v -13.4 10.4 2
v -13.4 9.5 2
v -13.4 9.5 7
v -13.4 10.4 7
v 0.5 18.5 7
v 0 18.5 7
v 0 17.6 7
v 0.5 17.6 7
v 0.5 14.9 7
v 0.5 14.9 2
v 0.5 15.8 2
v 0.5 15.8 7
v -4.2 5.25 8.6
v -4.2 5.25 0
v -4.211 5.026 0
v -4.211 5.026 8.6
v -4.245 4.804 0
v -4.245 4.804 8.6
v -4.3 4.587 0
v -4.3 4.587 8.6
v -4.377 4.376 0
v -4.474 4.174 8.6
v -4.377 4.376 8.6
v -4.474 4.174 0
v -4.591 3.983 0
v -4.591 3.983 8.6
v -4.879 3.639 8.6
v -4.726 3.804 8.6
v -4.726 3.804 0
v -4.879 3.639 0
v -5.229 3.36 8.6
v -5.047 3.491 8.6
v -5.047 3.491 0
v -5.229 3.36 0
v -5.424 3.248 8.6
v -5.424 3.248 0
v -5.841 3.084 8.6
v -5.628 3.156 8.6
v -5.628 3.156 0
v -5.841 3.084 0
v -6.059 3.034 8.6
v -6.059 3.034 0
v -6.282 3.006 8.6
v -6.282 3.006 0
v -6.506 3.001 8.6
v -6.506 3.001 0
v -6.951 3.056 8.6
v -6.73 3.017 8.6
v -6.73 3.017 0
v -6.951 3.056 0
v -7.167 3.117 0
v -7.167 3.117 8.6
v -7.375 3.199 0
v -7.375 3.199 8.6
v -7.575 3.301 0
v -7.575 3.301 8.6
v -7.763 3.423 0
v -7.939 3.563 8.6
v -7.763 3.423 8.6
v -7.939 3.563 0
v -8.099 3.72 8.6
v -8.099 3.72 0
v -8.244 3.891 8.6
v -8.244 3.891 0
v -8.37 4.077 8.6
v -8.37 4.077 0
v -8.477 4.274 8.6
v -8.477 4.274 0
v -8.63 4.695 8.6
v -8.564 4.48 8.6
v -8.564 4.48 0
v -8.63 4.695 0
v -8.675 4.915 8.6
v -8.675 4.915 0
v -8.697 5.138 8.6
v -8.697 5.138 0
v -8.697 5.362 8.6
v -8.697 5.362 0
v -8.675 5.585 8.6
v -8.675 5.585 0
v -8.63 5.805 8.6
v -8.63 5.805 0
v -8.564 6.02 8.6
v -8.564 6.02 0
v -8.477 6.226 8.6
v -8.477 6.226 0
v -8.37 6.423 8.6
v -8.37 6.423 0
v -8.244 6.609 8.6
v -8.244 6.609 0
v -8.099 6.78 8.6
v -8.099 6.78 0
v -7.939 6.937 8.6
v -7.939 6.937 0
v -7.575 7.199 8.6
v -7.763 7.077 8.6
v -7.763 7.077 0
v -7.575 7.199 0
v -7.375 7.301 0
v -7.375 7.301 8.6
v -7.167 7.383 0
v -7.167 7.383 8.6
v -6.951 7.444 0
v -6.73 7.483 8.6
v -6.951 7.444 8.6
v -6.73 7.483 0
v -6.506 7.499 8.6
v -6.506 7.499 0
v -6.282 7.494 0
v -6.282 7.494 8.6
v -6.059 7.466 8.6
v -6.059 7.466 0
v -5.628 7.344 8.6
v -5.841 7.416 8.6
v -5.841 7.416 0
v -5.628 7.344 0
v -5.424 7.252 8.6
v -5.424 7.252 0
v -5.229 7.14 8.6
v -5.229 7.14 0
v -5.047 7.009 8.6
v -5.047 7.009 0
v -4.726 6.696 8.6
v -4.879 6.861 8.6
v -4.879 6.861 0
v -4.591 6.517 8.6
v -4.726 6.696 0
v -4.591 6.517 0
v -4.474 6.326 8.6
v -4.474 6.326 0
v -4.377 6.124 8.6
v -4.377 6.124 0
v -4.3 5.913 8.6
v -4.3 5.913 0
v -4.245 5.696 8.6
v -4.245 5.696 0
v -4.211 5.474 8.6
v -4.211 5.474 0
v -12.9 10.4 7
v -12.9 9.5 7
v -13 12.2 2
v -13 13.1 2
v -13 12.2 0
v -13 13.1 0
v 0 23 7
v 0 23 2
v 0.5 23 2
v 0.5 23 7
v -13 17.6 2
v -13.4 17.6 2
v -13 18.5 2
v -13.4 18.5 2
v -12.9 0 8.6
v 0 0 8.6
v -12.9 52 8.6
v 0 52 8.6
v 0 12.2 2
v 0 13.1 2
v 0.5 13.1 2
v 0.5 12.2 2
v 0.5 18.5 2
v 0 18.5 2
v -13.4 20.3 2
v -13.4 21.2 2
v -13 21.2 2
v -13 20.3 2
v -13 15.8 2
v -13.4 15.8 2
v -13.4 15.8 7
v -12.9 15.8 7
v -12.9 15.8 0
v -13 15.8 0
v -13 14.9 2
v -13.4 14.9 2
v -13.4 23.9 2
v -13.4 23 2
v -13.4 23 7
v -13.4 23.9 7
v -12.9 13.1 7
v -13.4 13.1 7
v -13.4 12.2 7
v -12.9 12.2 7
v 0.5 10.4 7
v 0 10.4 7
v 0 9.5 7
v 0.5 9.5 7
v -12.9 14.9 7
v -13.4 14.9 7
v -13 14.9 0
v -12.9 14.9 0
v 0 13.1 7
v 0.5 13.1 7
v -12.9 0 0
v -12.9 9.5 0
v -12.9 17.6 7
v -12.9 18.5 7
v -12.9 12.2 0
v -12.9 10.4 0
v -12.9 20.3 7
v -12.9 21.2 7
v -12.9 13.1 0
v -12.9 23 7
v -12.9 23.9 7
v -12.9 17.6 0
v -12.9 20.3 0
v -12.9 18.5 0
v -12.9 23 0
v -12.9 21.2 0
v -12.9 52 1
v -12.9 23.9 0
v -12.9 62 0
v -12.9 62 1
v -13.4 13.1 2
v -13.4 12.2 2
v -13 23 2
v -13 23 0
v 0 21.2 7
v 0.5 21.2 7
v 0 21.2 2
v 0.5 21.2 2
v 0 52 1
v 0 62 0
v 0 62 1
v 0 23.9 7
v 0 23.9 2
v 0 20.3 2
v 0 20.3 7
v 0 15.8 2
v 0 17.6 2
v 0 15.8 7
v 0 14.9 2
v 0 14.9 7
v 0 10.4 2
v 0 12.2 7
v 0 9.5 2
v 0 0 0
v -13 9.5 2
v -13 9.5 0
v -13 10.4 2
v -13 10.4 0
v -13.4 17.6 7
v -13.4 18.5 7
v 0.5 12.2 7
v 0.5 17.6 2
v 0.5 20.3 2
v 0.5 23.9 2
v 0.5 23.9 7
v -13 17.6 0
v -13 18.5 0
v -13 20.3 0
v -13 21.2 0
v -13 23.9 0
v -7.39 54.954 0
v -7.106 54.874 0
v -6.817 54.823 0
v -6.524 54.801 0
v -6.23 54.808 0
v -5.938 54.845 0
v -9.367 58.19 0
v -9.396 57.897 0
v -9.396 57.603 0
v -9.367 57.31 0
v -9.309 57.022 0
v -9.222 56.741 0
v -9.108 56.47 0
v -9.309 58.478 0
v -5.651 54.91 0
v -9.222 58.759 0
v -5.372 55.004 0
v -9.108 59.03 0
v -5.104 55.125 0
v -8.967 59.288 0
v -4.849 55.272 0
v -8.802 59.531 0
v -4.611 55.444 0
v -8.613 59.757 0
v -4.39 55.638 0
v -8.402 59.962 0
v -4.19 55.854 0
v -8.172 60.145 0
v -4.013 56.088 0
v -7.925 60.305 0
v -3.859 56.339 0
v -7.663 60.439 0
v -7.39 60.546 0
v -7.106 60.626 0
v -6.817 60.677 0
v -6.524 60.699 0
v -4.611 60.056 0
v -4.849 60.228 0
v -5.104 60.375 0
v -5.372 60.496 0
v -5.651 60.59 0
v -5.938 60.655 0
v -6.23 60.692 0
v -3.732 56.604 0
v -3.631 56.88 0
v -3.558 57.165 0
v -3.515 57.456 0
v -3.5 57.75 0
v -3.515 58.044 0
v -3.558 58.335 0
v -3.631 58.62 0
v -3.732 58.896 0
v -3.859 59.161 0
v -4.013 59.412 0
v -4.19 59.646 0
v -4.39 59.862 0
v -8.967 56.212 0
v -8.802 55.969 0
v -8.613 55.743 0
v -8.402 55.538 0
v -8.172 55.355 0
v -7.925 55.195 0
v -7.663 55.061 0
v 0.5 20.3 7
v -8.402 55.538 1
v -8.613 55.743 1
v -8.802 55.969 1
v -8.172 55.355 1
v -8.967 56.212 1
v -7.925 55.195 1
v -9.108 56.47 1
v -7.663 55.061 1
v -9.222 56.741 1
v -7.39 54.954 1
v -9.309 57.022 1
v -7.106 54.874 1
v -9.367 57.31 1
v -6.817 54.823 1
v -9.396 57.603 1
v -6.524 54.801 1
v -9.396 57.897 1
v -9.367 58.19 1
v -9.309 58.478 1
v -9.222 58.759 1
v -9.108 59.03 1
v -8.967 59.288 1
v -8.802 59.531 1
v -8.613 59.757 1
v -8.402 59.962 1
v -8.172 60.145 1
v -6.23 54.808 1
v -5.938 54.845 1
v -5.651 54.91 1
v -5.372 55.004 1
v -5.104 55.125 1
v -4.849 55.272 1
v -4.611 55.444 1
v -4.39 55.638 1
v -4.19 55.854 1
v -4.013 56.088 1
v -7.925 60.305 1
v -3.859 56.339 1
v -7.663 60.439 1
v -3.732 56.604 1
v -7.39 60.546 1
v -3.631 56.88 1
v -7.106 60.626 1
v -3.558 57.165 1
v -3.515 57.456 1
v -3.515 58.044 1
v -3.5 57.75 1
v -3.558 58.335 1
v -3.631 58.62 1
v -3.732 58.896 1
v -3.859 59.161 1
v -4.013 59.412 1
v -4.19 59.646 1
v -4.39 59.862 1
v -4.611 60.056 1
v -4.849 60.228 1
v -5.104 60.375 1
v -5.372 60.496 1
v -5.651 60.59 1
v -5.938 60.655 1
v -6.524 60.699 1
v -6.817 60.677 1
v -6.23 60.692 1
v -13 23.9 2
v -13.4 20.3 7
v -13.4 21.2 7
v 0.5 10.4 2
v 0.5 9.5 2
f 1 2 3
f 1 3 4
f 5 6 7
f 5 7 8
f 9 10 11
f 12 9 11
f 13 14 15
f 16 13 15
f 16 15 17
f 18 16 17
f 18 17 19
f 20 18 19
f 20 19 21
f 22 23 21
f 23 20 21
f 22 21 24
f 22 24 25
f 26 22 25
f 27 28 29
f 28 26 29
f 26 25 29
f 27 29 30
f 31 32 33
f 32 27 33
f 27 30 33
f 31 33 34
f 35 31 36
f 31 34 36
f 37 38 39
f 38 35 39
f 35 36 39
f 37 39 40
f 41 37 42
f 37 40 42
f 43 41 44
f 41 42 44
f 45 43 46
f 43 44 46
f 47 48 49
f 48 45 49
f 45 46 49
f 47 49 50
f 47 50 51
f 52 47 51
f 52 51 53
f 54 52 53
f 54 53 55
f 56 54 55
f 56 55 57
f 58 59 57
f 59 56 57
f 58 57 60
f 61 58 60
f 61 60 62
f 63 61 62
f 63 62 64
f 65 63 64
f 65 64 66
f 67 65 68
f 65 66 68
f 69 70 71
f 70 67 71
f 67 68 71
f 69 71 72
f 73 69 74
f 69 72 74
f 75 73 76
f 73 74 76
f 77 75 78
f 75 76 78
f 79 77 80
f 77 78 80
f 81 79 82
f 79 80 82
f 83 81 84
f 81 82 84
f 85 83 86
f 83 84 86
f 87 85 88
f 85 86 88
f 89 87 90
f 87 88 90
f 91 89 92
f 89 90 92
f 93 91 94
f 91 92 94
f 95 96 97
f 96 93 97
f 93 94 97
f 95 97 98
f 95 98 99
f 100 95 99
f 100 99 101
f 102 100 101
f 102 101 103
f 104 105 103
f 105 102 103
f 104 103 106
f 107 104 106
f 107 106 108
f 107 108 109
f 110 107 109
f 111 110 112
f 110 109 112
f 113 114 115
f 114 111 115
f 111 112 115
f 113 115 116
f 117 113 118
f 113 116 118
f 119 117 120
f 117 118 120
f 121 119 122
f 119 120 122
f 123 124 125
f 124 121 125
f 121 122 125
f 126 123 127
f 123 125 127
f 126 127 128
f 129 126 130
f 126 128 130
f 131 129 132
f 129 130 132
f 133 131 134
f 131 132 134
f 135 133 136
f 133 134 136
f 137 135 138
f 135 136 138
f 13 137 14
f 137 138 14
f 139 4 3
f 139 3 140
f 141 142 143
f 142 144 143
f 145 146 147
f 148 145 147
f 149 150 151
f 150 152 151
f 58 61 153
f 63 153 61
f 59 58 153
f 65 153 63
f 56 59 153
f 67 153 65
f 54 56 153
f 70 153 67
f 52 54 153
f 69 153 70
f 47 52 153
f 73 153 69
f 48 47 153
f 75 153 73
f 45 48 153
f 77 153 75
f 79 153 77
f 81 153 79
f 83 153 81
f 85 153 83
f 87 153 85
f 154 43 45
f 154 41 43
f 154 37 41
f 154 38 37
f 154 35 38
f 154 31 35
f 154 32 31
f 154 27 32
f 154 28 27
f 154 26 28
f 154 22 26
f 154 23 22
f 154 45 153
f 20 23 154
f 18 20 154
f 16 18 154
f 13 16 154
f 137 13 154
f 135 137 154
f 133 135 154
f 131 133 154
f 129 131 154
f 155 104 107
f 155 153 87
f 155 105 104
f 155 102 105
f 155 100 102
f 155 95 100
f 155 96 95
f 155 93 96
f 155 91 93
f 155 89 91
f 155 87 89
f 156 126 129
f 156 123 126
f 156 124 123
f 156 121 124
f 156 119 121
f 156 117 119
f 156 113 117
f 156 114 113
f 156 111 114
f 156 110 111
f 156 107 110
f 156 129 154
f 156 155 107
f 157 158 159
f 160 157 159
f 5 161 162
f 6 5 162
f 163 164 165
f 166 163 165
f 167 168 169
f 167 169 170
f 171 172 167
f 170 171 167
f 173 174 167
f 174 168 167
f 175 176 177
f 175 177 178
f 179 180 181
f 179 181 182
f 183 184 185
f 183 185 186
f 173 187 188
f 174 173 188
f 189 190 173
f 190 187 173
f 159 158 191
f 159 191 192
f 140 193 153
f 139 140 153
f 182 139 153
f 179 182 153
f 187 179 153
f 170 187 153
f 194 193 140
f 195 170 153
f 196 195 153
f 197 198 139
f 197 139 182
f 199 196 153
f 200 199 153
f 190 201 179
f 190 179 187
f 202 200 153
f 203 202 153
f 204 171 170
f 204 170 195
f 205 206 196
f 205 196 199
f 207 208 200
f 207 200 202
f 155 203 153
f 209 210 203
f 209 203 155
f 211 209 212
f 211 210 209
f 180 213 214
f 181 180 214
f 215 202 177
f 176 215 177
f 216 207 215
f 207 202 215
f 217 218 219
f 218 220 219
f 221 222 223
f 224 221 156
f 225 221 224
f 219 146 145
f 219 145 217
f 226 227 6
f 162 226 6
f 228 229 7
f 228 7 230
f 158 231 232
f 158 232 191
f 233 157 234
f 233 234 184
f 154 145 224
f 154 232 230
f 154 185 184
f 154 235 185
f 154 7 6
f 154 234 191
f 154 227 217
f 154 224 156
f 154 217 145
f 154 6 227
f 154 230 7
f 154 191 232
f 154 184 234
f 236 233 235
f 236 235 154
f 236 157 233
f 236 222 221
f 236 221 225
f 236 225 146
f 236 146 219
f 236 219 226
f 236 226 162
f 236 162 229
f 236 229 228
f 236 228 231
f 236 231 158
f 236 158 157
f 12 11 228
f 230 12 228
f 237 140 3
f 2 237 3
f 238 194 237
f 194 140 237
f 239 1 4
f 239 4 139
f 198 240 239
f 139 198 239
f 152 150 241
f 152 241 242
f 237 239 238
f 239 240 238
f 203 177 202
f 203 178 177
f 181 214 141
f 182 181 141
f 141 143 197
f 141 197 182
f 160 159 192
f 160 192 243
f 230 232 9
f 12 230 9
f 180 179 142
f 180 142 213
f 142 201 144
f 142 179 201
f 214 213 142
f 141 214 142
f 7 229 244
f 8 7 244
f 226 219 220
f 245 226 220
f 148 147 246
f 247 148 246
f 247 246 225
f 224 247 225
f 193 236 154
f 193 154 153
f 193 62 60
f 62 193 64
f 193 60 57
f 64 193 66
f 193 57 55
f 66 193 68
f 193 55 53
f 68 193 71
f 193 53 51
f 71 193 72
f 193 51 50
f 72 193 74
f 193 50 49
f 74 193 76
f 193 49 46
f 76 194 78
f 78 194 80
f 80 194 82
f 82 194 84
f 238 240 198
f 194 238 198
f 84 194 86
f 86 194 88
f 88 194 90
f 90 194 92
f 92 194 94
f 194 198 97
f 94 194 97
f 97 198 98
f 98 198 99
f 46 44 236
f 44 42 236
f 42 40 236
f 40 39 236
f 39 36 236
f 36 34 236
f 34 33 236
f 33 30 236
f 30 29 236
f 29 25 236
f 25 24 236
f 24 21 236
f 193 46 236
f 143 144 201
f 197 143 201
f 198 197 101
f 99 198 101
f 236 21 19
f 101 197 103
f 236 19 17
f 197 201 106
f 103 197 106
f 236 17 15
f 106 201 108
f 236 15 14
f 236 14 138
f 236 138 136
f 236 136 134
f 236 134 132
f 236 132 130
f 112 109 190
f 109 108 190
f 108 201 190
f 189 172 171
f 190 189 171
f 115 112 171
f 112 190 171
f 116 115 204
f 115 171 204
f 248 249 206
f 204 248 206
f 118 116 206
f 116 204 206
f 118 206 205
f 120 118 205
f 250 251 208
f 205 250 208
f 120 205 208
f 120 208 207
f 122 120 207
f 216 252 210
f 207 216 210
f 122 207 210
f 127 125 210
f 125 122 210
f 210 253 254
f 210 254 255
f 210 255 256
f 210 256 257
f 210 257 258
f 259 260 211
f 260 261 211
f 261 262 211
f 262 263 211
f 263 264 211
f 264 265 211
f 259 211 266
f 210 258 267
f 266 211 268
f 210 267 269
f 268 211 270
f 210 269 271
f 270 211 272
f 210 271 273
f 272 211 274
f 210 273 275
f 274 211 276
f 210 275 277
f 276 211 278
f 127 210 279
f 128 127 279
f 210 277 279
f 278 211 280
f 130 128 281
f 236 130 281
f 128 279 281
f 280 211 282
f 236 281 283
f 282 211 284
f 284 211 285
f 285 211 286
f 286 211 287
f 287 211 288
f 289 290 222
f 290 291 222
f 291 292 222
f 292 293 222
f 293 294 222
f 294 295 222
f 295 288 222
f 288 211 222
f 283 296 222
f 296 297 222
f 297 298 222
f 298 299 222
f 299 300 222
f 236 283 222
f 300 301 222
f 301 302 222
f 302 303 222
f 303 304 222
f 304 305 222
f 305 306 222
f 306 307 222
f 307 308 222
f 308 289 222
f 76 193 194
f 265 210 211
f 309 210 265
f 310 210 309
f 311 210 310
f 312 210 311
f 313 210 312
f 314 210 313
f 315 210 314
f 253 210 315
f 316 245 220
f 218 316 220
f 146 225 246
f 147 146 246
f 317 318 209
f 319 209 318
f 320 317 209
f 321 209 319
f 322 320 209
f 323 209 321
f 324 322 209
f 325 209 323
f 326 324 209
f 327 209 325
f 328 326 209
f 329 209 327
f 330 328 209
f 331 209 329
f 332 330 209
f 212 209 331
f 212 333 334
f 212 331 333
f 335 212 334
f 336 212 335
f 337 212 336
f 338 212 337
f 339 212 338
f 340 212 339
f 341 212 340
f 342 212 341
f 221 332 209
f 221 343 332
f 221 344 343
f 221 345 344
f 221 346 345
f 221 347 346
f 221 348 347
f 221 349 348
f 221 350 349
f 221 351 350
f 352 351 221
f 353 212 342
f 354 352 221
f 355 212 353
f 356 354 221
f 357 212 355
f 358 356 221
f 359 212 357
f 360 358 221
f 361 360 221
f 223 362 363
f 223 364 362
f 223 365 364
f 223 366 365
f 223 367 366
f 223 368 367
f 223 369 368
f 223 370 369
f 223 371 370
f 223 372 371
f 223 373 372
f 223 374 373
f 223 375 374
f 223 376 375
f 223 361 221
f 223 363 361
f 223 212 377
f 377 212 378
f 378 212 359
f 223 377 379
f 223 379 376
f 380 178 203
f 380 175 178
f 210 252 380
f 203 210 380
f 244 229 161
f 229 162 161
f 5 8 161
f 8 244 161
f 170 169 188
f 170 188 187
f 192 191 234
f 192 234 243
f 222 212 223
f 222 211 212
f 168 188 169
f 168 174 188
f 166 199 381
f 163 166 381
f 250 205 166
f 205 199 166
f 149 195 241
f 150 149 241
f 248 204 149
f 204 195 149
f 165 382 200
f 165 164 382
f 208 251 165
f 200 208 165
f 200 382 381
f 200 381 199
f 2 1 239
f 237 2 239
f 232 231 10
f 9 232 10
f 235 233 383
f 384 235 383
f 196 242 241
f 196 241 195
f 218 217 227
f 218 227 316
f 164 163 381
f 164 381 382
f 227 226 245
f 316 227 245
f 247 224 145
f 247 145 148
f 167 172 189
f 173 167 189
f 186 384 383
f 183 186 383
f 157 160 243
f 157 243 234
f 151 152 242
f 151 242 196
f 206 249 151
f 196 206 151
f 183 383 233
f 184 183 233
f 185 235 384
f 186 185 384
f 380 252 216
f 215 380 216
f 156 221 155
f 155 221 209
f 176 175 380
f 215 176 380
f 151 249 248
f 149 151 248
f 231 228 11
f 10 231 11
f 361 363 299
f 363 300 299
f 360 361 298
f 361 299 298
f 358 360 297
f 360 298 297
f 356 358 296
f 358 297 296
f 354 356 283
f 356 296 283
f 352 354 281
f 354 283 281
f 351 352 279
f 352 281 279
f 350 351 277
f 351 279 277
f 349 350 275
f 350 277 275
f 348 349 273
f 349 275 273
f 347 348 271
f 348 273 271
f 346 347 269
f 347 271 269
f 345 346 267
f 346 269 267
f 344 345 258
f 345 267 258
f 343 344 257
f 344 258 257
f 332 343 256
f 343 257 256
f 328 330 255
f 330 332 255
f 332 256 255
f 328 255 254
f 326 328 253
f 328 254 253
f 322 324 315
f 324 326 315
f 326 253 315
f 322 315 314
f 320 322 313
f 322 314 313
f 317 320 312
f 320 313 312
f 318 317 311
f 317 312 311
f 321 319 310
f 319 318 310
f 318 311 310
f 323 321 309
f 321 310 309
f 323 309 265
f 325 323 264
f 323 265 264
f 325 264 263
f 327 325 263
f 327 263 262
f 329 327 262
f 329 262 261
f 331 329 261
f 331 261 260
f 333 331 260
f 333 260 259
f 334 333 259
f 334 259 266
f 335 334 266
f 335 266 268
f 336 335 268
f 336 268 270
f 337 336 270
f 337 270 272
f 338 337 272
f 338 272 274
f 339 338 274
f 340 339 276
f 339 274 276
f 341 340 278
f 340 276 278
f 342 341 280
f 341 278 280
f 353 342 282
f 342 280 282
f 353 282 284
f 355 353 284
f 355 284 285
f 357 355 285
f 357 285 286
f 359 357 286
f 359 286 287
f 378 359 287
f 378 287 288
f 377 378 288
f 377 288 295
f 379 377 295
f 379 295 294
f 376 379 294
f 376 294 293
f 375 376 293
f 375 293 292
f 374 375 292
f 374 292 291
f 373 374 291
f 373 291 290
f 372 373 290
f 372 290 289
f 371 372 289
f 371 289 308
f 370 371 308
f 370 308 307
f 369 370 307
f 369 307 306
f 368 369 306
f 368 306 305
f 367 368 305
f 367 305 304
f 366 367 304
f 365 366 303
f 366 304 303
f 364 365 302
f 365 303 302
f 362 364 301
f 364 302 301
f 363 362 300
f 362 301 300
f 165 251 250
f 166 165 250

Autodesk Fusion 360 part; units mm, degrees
sketch "Sketch1" plane through (0, 0, 0) normal (0, 0, 1) x (1, 0, 0)
  line L0 (0, 0) -> (-12.9, 0)
  line L1 (-12.9, 0) -> (-12.9, 62)
  line L2 (-12.9, 62) -> (0, 62)
  line L3 (0, 62) -> (0, 0)
  circle A0 centre (-6.45, 57.75) radius 2.95
  line L4 (-12.9, 62) -> (0, 62)
  line L5 (0, 62) -> (0, 52)
  line L6 (0, 52) -> (-12.9, 52)
  line L7 (-12.9, 52) -> (-12.9, 62)
  line L8 (-12.9, 9.5) -> (-13.4, 9.5)
  line L9 (-13.4, 9.5) -> (-13.4, 10.4)
  line L10 (-13.4, 10.4) -> (-12.9, 10.4)
  line L11 (-12.9, 10.4) -> (-12.9, 9.5)
  line L12 (-12.9, 13.1) -> (-13.4, 13.1)
  line L13 (-13.4, 13.1) -> (-13.4, 12.2)
  line L14 (-13.4, 12.2) -> (-12.9, 12.2)
  line L15 (-12.9, 12.2) -> (-12.9, 13.1)
  line L16 (-12.9, 14.9) -> (-13.4, 14.9)
  line L17 (-13.4, 14.9) -> (-13.4, 15.8)
  line L18 (-13.4, 15.8) -> (-12.9, 15.8)
  line L19 (-12.9, 15.8) -> (-12.9, 14.9)
  line L20 (-12.9, 17.6) -> (-13.4, 17.6)
  line L21 (-13.4, 17.6) -> (-13.4, 18.5)
  line L22 (-13.4, 18.5) -> (-12.9, 18.5)
  line L23 (-12.9, 18.5) -> (-12.9, 17.6)
  line L24 (-12.9, 20.3) -> (-13.4, 20.3)
  line L25 (-13.4, 20.3) -> (-13.4, 21.2)
  line L26 (-13.4, 21.2) -> (-12.9, 21.2)
  line L27 (-12.9, 21.2) -> (-12.9, 20.3)
  line L28 (-12.9, 23) -> (-13.4, 23)
  line L29 (-13.4, 23) -> (-13.4, 23.9)
  line L30 (-13.4, 23.9) -> (-12.9, 23.9)
  line L31 (-12.9, 23.9) -> (-12.9, 23)
  line L32 (0.5, 23.9) -> (0, 23.9)
  line L33 (0.5, 23) -> (0.5, 23.9)
  line L34 (0, 23) -> (0.5, 23)
  line L35 (0.5, 21.2) -> (0, 21.2)
  line L36 (0.5, 20.3) -> (0.5, 21.2)
  line L37 (0, 20.3) -> (0.5, 20.3)
  line L38 (0.5, 18.5) -> (0, 18.5)
  line L39 (0.5, 17.6) -> (0.5, 18.5)
  line L40 (0, 17.6) -> (0.5, 17.6)
  line L41 (0.5, 15.8) -> (0, 15.8)
  line L42 (0.5, 14.9) -> (0.5, 15.8)
  line L43 (0, 14.9) -> (0.5, 14.9)
  line L44 (0, 13.1) -> (0.5, 13.1)
  line L45 (0.5, 13.1) -> (0.5, 12.2)
  line L46 (0.5, 12.2) -> (0, 12.2)
  line L47 (0.5, 10.4) -> (0, 10.4)
  line L48 (0.5, 9.5) -> (0.5, 10.4)
  line L49 (0, 9.5) -> (0.5, 9.5)
  circle A1 centre (-6.45, 5.25) radius 2.25
  dimension "d1" = 12.9
  dimension "d2" = 62
  dimension "d3" = 5.9
  dimension "d4" = 4.25
  dimension "d5" = 6.45
  dimension "d6" = 10
  dimension "d7" = 0.5
  dimension "d8" = 0.9
  dimension "d9" = 9.5
  dimension "d10" = 0.5
  dimension "d11" = 0.9
  dimension "d12" = 0.5
  dimension "d13" = 0.9
  dimension "d14" = 0.5
  dimension "d15" = 0.9
  dimension "d16" = 0.9
  dimension "d17" = 0.5
  dimension "d18" = 0.9
  dimension "d19" = 1.8
  dimension "d20" = 2.7
  dimension "d21" = 1.8
  dimension "d22" = 1.8
  dimension "d23" = 1.8
  dimension "d24" = 4.5
  dimension "d25" = 5.25
  dimension "d26" = 6.45
extrude "Extrude1" add sketch "Sketch1" along normal blind 1 contours L1 L2 L3 L4 L5 L6 L7
extrude "Extrude2" add sketch "Sketch1" along normal blind 8.6 contours L0 L1 L3 L6 L11 L15 L19 L23 L27 L31
extrude "Extrude3" add sketch "Sketch1" along normal blind 7 contours L3 L47 L48 L49 | L1 L8 L9 L10 L11 | L3 L44 L45 L46 | L1 L12 L13 L14 L15 | L3 L41 L42 L43 | L1 L16 L17 L18 L19 | L3 L38 L39 L40 | L1 L20 L21 L22 L23 | L3 L35 L36 L37 | L1 L24 L25 L26 L27 | L3 L32 L33 L34 | L1 L28 L29 L30 L31
sketch "Sketch2" plane through (0, 0, 0) normal (0, 0, 1) x (1, 0, 0)
  line L0 (0, 0) -> (22, 0)
  line L1 (22, 0) -> (22, 28)
  line L2 (22, 28) -> (0, 28)
  line L3 (0, 28) -> (0, 0)
  line L4 (-13, 0) -> (-34, 0)
  line L5 (-34, 0) -> (-34, 25)
  line L6 (-34, 25) -> (-13, 25)
  line L7 (-13, 25) -> (-13, 0)
extrude "Extrude4" cut sketch "Sketch2" along normal blind 2
equation "d4 = d3 / 2 + 1.3 mm"
equation "d5 = d3 / 2 + ( d1 - d3 ) / 2"
equation "d20 = 1.8 mm + d13"
equation "d25 = d24 / 2 + 3 mm"
equation "d26 = d24 / 2 + ( d1 - d24 ) / 2"
